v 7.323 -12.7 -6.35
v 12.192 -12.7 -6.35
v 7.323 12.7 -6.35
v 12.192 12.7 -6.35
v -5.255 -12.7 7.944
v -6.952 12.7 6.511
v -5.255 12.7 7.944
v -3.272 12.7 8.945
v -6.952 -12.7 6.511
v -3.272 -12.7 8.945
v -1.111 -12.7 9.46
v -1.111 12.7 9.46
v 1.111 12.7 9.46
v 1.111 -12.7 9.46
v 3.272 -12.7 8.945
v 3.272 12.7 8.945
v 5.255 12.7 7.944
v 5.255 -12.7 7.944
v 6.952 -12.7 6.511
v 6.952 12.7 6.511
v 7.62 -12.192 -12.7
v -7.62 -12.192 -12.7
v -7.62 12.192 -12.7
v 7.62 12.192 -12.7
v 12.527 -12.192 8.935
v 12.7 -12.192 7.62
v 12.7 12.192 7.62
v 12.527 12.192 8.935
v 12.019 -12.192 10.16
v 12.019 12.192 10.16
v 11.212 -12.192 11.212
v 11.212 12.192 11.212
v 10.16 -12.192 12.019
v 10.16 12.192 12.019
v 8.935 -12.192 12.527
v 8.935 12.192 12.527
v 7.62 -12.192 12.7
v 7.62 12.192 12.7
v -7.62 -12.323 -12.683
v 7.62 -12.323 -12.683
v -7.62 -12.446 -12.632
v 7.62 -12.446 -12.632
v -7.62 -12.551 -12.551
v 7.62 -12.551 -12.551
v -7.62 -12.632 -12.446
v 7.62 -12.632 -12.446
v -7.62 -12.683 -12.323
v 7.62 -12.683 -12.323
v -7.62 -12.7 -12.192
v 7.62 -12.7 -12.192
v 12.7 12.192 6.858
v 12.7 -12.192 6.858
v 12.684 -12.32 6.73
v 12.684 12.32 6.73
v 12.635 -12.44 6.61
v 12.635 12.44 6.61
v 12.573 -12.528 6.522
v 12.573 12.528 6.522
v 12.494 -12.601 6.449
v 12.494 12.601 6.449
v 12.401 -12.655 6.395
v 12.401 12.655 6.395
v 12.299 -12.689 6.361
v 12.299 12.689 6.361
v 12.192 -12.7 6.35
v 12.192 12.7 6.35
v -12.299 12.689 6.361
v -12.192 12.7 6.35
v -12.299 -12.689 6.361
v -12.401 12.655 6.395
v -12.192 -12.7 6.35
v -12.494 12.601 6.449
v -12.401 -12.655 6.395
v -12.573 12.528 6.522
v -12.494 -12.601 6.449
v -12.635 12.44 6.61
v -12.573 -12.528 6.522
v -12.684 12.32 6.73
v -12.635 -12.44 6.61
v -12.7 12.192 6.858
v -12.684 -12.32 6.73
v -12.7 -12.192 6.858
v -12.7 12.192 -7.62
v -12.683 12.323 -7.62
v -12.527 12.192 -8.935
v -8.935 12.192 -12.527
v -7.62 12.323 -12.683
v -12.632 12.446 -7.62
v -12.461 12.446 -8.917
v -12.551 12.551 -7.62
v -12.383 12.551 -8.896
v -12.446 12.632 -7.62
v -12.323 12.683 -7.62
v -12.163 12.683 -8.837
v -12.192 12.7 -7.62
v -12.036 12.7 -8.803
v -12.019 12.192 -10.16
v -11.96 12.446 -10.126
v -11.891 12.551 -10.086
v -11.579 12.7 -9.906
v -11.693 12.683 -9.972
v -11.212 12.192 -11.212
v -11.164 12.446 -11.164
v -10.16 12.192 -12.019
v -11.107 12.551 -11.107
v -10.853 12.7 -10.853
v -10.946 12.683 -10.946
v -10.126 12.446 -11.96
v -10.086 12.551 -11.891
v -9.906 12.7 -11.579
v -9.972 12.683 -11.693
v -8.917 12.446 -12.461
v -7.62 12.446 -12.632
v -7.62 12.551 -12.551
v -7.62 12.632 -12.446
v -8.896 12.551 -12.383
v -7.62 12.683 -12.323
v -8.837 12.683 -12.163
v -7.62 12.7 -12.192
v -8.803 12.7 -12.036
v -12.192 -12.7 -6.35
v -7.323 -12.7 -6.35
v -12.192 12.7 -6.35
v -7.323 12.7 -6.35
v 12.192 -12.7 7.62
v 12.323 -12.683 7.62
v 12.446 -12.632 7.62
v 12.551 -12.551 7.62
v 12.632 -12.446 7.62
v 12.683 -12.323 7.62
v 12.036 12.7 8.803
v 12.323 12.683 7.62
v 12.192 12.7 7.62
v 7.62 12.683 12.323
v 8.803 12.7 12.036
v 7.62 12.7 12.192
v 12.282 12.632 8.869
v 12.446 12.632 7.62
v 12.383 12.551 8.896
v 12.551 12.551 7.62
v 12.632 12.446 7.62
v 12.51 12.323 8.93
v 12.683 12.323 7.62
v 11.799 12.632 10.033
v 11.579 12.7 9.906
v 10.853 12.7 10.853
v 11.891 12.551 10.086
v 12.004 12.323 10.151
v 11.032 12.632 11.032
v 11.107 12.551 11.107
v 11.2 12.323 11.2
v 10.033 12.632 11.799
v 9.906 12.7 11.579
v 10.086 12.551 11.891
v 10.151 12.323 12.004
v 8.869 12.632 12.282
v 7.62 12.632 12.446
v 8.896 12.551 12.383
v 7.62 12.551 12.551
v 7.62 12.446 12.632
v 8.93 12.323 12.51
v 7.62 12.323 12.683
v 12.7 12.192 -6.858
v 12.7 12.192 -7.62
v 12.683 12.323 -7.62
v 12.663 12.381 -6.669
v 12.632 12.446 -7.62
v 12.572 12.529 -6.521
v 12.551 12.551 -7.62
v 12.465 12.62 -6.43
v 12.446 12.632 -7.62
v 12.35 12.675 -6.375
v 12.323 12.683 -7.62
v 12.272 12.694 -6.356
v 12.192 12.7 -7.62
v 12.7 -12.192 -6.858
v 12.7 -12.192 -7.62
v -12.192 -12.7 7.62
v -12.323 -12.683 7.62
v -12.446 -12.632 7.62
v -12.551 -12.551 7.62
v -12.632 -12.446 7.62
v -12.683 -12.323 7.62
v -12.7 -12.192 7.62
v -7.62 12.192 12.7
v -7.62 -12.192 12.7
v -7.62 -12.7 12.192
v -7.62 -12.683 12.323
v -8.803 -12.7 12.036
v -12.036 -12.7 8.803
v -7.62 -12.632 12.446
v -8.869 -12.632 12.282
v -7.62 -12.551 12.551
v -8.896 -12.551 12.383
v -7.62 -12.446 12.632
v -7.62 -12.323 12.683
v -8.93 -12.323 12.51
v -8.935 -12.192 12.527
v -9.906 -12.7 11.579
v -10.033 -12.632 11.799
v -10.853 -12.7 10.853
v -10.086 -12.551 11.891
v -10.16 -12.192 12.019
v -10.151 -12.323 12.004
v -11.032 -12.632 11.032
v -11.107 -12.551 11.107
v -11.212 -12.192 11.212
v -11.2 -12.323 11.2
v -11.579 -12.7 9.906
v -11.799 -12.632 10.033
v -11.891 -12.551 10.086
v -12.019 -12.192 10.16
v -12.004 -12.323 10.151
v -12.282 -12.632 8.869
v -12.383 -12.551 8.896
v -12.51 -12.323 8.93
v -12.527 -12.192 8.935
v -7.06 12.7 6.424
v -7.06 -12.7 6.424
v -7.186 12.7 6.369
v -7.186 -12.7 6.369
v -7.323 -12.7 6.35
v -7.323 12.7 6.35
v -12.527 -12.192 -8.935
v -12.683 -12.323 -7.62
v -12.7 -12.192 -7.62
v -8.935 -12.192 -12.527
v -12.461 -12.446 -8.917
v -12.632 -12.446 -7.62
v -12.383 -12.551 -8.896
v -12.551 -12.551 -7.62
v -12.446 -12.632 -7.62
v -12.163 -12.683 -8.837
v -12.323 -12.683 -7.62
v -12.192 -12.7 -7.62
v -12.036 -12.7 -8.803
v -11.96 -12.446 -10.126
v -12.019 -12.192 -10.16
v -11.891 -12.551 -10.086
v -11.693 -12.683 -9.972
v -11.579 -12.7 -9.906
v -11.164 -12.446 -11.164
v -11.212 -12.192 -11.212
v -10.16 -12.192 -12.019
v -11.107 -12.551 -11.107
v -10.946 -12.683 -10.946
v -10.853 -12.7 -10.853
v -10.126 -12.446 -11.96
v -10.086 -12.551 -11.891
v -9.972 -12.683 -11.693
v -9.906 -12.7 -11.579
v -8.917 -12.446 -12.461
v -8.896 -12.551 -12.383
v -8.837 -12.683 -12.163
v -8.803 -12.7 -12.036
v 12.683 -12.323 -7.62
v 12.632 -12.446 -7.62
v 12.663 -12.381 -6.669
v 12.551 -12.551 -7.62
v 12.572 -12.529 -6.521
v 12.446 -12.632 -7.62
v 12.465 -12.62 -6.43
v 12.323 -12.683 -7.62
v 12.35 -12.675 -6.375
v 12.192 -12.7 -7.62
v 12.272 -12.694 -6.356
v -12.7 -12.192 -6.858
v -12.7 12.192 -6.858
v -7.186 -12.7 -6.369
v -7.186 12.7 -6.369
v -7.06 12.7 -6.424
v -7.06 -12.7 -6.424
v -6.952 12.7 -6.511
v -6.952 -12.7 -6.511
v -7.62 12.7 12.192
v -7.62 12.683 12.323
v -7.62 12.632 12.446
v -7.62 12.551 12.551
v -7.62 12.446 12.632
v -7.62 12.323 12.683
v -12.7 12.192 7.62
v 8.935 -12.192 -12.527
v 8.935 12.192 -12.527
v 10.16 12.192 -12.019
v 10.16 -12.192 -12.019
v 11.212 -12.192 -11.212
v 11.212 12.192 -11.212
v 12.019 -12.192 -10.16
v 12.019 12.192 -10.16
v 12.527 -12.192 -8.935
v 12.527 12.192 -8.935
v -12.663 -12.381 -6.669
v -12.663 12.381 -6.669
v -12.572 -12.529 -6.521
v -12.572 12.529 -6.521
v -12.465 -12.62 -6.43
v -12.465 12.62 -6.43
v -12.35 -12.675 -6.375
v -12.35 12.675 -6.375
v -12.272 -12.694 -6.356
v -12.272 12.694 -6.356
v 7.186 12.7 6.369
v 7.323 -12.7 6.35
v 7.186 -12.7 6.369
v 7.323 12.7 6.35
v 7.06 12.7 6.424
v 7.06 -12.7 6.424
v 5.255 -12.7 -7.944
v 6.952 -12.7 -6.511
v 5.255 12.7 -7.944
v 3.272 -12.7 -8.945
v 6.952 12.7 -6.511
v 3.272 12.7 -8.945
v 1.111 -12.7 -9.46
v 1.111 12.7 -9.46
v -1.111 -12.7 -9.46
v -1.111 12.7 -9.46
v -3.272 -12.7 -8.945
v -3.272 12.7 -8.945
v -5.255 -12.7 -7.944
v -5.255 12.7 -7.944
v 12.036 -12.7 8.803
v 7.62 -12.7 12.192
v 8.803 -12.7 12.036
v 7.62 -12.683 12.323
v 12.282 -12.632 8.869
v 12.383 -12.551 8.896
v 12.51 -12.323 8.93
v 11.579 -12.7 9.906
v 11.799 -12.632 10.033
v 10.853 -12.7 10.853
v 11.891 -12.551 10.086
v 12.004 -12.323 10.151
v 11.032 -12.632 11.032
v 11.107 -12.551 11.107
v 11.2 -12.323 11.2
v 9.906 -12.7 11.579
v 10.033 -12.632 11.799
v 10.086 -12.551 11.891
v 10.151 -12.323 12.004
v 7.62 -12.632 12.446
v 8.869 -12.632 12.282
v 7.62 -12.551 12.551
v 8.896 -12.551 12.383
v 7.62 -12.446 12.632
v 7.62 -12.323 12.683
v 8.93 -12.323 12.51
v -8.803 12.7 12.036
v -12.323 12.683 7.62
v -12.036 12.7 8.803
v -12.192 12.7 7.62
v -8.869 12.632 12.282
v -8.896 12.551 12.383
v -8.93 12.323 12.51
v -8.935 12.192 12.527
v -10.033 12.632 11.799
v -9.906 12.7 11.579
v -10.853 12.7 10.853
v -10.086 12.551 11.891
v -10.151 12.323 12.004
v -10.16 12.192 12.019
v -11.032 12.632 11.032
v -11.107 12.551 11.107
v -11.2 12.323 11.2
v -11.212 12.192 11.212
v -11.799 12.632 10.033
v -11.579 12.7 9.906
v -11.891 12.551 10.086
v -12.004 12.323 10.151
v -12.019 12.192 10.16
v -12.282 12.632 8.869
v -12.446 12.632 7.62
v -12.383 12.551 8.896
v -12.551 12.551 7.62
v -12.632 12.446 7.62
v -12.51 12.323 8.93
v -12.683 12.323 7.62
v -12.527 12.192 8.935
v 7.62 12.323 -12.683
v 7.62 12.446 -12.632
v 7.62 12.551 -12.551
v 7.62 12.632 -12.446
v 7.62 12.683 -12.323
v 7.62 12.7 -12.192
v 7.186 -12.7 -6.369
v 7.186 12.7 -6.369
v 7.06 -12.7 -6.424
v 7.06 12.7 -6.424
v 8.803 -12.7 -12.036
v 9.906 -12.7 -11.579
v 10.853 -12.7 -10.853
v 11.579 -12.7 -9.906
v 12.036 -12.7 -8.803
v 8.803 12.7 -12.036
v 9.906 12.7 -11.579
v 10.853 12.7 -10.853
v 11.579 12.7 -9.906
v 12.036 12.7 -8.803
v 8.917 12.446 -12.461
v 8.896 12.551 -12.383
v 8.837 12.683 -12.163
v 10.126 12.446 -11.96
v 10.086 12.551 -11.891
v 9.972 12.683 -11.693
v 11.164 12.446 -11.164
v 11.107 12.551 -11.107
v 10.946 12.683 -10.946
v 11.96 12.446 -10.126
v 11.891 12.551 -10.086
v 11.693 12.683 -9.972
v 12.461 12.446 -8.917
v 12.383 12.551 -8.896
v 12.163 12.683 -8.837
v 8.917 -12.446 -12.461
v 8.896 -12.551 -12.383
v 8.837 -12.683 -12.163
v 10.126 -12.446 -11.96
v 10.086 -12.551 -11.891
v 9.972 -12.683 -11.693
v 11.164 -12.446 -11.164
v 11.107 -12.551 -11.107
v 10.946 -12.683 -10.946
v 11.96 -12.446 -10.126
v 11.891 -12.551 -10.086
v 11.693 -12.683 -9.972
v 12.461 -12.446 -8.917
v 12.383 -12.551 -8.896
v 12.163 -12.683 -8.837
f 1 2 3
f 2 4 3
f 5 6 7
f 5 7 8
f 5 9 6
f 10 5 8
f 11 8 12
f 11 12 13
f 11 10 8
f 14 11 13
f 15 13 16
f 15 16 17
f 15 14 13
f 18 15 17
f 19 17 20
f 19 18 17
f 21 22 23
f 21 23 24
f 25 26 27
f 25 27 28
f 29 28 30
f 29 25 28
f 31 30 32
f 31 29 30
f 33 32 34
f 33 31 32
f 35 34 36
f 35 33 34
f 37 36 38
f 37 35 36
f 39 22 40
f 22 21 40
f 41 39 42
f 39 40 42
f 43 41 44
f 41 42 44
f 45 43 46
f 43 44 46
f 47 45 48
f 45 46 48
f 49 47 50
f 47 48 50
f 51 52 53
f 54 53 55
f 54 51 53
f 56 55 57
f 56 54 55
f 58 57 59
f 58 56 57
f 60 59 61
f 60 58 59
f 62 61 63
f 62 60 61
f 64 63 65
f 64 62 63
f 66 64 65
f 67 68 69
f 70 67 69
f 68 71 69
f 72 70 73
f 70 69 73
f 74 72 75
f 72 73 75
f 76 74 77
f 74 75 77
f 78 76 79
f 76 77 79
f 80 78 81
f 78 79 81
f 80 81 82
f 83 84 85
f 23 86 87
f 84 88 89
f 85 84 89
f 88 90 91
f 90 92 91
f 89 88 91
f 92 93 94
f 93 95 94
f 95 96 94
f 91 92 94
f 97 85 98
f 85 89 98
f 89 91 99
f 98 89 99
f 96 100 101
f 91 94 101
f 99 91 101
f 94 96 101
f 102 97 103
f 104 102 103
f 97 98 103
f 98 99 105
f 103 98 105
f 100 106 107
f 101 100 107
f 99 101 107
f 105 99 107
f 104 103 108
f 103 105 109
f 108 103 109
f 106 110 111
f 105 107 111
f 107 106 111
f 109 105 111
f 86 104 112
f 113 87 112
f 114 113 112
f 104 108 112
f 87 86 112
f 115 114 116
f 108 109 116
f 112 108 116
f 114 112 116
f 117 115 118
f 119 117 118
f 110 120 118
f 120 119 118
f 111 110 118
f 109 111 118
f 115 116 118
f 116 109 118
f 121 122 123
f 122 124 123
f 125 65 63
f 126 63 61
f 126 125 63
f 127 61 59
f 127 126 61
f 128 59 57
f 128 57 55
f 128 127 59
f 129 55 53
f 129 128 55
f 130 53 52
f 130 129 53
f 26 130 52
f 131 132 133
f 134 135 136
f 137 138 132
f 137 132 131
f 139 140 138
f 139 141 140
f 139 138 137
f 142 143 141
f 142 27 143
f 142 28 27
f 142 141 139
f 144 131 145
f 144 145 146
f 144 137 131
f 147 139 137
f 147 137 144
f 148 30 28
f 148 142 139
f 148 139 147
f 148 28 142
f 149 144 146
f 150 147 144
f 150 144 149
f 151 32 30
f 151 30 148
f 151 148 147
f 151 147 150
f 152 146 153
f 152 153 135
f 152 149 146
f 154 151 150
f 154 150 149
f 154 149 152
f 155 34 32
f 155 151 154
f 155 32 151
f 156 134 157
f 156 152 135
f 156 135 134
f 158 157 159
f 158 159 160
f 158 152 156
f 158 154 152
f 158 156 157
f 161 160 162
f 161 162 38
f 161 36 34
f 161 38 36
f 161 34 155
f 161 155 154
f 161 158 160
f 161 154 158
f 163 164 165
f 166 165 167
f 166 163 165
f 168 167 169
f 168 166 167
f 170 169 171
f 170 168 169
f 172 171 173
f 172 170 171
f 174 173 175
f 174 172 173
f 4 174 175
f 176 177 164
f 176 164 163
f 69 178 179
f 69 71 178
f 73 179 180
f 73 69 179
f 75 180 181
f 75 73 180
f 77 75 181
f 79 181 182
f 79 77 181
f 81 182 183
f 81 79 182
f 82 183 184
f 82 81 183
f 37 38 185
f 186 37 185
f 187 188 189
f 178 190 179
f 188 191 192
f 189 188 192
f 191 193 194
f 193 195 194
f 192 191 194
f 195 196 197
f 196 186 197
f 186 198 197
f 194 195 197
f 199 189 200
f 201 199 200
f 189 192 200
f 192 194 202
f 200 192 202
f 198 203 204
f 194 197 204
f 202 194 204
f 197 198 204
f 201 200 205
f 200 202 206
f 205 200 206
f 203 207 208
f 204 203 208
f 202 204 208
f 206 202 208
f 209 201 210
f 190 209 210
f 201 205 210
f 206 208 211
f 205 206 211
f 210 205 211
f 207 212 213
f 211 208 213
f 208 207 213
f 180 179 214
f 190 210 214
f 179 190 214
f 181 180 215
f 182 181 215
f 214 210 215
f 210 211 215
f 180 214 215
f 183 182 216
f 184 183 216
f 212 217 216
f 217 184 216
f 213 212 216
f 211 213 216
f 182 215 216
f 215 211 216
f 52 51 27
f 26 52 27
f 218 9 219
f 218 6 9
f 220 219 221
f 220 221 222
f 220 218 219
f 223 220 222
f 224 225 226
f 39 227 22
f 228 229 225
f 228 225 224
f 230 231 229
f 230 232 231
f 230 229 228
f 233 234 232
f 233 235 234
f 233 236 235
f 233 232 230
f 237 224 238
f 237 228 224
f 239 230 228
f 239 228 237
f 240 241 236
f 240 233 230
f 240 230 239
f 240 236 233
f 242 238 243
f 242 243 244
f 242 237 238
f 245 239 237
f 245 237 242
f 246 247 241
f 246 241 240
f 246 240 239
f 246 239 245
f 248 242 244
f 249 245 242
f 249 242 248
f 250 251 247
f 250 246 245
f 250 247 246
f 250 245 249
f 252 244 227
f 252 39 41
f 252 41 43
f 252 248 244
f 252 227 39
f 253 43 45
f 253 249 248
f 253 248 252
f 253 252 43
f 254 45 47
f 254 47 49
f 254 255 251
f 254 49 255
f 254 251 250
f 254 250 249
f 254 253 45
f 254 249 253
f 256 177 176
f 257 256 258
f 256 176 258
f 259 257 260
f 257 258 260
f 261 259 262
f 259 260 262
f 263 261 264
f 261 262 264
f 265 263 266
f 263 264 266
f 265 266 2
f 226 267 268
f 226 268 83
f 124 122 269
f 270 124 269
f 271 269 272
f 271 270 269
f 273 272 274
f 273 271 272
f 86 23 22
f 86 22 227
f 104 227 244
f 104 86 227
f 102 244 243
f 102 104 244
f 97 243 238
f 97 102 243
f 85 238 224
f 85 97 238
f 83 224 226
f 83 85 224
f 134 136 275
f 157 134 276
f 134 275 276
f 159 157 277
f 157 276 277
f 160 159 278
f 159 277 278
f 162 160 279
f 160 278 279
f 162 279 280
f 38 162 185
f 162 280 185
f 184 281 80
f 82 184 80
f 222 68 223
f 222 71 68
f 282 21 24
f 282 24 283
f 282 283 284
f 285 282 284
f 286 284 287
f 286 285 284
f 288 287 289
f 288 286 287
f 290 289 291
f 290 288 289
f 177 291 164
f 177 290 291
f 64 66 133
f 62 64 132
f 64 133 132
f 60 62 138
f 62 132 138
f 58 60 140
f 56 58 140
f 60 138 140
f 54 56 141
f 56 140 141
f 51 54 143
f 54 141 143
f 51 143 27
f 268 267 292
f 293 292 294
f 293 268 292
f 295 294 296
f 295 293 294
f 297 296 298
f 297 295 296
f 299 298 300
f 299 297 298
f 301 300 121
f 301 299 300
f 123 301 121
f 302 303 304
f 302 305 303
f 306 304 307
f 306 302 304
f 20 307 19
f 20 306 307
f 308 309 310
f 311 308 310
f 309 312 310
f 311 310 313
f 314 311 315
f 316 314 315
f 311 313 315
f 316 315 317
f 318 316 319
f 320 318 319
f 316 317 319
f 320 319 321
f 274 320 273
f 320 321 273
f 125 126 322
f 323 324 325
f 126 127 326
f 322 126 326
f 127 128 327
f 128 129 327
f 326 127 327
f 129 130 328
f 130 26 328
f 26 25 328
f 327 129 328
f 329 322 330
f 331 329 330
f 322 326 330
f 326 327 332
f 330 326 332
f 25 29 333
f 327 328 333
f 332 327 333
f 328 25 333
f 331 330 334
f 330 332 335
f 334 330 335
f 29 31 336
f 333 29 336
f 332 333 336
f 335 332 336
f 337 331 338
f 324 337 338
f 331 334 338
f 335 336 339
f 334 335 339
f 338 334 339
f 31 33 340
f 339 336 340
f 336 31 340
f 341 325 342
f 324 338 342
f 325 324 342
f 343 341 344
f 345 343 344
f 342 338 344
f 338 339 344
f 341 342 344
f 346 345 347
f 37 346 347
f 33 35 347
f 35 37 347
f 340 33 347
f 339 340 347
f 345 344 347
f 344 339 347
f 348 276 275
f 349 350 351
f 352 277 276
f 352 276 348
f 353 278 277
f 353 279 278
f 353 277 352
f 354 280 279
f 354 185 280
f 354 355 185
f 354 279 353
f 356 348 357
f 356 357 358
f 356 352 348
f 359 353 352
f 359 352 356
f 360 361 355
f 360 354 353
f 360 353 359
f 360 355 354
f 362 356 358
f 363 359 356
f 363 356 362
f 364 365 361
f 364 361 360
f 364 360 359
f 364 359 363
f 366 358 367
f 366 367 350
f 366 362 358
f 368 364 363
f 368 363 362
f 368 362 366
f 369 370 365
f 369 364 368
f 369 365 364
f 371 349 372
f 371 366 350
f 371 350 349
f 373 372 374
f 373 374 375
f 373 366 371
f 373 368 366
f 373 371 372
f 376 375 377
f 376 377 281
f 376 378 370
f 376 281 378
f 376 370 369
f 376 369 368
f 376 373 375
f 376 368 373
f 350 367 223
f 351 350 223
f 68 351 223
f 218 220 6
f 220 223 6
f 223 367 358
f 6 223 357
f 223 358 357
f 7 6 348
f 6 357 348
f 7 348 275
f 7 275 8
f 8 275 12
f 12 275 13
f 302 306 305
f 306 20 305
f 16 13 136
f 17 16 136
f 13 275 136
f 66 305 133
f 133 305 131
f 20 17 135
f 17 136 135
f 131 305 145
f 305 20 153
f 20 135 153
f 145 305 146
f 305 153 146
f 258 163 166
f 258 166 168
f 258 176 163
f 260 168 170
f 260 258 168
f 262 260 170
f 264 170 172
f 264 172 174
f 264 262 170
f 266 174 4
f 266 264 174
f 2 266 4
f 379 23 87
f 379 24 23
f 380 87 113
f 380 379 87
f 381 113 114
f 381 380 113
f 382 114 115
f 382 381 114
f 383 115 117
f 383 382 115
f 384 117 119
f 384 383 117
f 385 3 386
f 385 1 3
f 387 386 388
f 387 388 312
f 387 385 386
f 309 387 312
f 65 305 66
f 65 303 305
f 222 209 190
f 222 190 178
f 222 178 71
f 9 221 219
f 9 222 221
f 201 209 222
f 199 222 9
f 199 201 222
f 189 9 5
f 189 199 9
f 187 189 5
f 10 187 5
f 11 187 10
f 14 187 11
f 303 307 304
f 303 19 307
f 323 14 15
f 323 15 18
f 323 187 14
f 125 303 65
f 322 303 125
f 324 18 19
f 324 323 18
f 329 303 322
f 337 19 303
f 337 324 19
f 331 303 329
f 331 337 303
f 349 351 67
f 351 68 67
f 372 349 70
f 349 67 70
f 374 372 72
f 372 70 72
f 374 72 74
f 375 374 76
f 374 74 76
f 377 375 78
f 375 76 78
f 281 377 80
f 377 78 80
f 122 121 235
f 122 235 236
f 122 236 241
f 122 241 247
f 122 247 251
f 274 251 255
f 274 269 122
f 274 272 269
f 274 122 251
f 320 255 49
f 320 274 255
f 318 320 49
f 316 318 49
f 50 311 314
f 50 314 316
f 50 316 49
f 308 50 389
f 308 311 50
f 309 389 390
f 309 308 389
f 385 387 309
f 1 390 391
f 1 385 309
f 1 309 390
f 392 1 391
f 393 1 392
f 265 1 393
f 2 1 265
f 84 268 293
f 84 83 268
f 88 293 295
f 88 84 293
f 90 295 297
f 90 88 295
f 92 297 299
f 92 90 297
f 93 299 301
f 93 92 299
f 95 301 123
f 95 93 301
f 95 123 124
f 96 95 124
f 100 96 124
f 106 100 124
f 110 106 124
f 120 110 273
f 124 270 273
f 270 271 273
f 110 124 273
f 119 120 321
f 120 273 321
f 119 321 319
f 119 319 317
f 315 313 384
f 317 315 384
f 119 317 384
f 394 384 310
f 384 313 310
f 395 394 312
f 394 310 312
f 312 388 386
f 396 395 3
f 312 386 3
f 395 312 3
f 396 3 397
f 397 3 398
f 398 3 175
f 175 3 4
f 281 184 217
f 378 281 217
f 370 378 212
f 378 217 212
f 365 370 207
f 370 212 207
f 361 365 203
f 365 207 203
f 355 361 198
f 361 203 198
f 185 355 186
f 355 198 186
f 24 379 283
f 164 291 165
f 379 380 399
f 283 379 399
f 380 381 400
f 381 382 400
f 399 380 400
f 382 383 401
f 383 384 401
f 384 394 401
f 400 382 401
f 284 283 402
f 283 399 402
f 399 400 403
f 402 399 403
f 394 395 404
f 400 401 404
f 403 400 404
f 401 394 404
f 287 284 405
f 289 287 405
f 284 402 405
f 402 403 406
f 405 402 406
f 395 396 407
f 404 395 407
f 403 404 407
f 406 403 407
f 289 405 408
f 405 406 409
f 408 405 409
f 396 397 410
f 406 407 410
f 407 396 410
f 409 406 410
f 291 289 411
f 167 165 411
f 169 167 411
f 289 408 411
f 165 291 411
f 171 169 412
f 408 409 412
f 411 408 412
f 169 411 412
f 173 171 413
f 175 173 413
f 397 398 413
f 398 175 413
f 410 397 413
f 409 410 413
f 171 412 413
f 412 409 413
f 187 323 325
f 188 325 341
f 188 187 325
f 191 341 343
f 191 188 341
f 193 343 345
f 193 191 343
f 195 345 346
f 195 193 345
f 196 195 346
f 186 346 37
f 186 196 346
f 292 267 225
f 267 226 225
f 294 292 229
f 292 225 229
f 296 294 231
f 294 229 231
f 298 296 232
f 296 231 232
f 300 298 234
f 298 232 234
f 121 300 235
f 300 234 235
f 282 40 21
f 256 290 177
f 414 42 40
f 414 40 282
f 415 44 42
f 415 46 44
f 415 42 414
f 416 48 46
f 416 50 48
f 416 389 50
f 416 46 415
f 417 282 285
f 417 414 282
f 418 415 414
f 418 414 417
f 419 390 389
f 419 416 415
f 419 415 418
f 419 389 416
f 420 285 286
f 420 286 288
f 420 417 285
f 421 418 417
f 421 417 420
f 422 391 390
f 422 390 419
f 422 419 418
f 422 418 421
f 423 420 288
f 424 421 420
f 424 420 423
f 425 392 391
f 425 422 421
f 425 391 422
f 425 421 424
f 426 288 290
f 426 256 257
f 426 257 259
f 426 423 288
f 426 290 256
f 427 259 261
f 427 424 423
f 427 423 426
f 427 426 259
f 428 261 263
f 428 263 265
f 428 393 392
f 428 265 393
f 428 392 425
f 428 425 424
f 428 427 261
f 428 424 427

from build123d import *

# Parameters (mm, degrees)
F1_DEPTH = 12.7
F2_R     = 5.08
F3_R     = 0.508


with BuildPart() as f1:
    # F0 (on Front) → F1 (new body, symmetric)
    with BuildSketch(Plane.XZ):
        with BuildLine():
            Line((-12.7, -12.7), (12.7, -12.7))
            Line((12.7, -12.7), (12.7, -6.35))
            Line((12.7, -6.35), (7.099516, -6.35))
            ThreePointArc((7.099516, -6.35), (0, -9.525), (-7.099516, -6.35))
            Line((-7.099516, -6.35), (-12.7, -6.35))
            Line((-12.7, -6.35), (-12.7, -12.7))
        make_face()
        with BuildLine():
            Line((12.7, 6.35), (12.7, 12.7))
            Line((12.7, 12.7), (-12.7, 12.7))
            Line((-12.7, 12.7), (-12.7, 6.35))
            Line((-12.7, 6.35), (-7.099516, 6.35))
            ThreePointArc((-7.099516, 6.35), (0, 9.525), (7.099516, 6.35))
            Line((7.099516, 6.35), (12.7, 6.35))
        make_face()
    extrude(amount=F1_DEPTH, both=True)

    # F2
    f2_edges = [f1.edges().sort_by_distance(p)[0] for p in [
        (12.7, 0, 12.7),
        (-12.7, 0, 12.7),
        (12.7, 0, -12.7),
        (-12.7, 0, -12.7),
    ]]
    fillet(f2_edges, radius=F2_R)

    # F3
    f3_edges = [f1.edges().sort_by_distance(p)[0] for p in [
        (0, -12.7, 12.7),
        (0, 12.7, 12.7),
        (0, -12.7, -12.7),
        (0, 12.7, -12.7),
        (-12.7, 0, 6.35),
        (-7.099516, 0, 6.35),
        (7.099516, 0, 6.35),
        (12.7, 0, 6.35),
        (12.7, 0, -6.35),
        (-12.7, 0, -6.35),
        (7.099516, 0, -6.35),
        (-7.099516, 0, -6.35),
    ]]
    fillet(f3_edges, radius=F3_R)


solid = f1.part
